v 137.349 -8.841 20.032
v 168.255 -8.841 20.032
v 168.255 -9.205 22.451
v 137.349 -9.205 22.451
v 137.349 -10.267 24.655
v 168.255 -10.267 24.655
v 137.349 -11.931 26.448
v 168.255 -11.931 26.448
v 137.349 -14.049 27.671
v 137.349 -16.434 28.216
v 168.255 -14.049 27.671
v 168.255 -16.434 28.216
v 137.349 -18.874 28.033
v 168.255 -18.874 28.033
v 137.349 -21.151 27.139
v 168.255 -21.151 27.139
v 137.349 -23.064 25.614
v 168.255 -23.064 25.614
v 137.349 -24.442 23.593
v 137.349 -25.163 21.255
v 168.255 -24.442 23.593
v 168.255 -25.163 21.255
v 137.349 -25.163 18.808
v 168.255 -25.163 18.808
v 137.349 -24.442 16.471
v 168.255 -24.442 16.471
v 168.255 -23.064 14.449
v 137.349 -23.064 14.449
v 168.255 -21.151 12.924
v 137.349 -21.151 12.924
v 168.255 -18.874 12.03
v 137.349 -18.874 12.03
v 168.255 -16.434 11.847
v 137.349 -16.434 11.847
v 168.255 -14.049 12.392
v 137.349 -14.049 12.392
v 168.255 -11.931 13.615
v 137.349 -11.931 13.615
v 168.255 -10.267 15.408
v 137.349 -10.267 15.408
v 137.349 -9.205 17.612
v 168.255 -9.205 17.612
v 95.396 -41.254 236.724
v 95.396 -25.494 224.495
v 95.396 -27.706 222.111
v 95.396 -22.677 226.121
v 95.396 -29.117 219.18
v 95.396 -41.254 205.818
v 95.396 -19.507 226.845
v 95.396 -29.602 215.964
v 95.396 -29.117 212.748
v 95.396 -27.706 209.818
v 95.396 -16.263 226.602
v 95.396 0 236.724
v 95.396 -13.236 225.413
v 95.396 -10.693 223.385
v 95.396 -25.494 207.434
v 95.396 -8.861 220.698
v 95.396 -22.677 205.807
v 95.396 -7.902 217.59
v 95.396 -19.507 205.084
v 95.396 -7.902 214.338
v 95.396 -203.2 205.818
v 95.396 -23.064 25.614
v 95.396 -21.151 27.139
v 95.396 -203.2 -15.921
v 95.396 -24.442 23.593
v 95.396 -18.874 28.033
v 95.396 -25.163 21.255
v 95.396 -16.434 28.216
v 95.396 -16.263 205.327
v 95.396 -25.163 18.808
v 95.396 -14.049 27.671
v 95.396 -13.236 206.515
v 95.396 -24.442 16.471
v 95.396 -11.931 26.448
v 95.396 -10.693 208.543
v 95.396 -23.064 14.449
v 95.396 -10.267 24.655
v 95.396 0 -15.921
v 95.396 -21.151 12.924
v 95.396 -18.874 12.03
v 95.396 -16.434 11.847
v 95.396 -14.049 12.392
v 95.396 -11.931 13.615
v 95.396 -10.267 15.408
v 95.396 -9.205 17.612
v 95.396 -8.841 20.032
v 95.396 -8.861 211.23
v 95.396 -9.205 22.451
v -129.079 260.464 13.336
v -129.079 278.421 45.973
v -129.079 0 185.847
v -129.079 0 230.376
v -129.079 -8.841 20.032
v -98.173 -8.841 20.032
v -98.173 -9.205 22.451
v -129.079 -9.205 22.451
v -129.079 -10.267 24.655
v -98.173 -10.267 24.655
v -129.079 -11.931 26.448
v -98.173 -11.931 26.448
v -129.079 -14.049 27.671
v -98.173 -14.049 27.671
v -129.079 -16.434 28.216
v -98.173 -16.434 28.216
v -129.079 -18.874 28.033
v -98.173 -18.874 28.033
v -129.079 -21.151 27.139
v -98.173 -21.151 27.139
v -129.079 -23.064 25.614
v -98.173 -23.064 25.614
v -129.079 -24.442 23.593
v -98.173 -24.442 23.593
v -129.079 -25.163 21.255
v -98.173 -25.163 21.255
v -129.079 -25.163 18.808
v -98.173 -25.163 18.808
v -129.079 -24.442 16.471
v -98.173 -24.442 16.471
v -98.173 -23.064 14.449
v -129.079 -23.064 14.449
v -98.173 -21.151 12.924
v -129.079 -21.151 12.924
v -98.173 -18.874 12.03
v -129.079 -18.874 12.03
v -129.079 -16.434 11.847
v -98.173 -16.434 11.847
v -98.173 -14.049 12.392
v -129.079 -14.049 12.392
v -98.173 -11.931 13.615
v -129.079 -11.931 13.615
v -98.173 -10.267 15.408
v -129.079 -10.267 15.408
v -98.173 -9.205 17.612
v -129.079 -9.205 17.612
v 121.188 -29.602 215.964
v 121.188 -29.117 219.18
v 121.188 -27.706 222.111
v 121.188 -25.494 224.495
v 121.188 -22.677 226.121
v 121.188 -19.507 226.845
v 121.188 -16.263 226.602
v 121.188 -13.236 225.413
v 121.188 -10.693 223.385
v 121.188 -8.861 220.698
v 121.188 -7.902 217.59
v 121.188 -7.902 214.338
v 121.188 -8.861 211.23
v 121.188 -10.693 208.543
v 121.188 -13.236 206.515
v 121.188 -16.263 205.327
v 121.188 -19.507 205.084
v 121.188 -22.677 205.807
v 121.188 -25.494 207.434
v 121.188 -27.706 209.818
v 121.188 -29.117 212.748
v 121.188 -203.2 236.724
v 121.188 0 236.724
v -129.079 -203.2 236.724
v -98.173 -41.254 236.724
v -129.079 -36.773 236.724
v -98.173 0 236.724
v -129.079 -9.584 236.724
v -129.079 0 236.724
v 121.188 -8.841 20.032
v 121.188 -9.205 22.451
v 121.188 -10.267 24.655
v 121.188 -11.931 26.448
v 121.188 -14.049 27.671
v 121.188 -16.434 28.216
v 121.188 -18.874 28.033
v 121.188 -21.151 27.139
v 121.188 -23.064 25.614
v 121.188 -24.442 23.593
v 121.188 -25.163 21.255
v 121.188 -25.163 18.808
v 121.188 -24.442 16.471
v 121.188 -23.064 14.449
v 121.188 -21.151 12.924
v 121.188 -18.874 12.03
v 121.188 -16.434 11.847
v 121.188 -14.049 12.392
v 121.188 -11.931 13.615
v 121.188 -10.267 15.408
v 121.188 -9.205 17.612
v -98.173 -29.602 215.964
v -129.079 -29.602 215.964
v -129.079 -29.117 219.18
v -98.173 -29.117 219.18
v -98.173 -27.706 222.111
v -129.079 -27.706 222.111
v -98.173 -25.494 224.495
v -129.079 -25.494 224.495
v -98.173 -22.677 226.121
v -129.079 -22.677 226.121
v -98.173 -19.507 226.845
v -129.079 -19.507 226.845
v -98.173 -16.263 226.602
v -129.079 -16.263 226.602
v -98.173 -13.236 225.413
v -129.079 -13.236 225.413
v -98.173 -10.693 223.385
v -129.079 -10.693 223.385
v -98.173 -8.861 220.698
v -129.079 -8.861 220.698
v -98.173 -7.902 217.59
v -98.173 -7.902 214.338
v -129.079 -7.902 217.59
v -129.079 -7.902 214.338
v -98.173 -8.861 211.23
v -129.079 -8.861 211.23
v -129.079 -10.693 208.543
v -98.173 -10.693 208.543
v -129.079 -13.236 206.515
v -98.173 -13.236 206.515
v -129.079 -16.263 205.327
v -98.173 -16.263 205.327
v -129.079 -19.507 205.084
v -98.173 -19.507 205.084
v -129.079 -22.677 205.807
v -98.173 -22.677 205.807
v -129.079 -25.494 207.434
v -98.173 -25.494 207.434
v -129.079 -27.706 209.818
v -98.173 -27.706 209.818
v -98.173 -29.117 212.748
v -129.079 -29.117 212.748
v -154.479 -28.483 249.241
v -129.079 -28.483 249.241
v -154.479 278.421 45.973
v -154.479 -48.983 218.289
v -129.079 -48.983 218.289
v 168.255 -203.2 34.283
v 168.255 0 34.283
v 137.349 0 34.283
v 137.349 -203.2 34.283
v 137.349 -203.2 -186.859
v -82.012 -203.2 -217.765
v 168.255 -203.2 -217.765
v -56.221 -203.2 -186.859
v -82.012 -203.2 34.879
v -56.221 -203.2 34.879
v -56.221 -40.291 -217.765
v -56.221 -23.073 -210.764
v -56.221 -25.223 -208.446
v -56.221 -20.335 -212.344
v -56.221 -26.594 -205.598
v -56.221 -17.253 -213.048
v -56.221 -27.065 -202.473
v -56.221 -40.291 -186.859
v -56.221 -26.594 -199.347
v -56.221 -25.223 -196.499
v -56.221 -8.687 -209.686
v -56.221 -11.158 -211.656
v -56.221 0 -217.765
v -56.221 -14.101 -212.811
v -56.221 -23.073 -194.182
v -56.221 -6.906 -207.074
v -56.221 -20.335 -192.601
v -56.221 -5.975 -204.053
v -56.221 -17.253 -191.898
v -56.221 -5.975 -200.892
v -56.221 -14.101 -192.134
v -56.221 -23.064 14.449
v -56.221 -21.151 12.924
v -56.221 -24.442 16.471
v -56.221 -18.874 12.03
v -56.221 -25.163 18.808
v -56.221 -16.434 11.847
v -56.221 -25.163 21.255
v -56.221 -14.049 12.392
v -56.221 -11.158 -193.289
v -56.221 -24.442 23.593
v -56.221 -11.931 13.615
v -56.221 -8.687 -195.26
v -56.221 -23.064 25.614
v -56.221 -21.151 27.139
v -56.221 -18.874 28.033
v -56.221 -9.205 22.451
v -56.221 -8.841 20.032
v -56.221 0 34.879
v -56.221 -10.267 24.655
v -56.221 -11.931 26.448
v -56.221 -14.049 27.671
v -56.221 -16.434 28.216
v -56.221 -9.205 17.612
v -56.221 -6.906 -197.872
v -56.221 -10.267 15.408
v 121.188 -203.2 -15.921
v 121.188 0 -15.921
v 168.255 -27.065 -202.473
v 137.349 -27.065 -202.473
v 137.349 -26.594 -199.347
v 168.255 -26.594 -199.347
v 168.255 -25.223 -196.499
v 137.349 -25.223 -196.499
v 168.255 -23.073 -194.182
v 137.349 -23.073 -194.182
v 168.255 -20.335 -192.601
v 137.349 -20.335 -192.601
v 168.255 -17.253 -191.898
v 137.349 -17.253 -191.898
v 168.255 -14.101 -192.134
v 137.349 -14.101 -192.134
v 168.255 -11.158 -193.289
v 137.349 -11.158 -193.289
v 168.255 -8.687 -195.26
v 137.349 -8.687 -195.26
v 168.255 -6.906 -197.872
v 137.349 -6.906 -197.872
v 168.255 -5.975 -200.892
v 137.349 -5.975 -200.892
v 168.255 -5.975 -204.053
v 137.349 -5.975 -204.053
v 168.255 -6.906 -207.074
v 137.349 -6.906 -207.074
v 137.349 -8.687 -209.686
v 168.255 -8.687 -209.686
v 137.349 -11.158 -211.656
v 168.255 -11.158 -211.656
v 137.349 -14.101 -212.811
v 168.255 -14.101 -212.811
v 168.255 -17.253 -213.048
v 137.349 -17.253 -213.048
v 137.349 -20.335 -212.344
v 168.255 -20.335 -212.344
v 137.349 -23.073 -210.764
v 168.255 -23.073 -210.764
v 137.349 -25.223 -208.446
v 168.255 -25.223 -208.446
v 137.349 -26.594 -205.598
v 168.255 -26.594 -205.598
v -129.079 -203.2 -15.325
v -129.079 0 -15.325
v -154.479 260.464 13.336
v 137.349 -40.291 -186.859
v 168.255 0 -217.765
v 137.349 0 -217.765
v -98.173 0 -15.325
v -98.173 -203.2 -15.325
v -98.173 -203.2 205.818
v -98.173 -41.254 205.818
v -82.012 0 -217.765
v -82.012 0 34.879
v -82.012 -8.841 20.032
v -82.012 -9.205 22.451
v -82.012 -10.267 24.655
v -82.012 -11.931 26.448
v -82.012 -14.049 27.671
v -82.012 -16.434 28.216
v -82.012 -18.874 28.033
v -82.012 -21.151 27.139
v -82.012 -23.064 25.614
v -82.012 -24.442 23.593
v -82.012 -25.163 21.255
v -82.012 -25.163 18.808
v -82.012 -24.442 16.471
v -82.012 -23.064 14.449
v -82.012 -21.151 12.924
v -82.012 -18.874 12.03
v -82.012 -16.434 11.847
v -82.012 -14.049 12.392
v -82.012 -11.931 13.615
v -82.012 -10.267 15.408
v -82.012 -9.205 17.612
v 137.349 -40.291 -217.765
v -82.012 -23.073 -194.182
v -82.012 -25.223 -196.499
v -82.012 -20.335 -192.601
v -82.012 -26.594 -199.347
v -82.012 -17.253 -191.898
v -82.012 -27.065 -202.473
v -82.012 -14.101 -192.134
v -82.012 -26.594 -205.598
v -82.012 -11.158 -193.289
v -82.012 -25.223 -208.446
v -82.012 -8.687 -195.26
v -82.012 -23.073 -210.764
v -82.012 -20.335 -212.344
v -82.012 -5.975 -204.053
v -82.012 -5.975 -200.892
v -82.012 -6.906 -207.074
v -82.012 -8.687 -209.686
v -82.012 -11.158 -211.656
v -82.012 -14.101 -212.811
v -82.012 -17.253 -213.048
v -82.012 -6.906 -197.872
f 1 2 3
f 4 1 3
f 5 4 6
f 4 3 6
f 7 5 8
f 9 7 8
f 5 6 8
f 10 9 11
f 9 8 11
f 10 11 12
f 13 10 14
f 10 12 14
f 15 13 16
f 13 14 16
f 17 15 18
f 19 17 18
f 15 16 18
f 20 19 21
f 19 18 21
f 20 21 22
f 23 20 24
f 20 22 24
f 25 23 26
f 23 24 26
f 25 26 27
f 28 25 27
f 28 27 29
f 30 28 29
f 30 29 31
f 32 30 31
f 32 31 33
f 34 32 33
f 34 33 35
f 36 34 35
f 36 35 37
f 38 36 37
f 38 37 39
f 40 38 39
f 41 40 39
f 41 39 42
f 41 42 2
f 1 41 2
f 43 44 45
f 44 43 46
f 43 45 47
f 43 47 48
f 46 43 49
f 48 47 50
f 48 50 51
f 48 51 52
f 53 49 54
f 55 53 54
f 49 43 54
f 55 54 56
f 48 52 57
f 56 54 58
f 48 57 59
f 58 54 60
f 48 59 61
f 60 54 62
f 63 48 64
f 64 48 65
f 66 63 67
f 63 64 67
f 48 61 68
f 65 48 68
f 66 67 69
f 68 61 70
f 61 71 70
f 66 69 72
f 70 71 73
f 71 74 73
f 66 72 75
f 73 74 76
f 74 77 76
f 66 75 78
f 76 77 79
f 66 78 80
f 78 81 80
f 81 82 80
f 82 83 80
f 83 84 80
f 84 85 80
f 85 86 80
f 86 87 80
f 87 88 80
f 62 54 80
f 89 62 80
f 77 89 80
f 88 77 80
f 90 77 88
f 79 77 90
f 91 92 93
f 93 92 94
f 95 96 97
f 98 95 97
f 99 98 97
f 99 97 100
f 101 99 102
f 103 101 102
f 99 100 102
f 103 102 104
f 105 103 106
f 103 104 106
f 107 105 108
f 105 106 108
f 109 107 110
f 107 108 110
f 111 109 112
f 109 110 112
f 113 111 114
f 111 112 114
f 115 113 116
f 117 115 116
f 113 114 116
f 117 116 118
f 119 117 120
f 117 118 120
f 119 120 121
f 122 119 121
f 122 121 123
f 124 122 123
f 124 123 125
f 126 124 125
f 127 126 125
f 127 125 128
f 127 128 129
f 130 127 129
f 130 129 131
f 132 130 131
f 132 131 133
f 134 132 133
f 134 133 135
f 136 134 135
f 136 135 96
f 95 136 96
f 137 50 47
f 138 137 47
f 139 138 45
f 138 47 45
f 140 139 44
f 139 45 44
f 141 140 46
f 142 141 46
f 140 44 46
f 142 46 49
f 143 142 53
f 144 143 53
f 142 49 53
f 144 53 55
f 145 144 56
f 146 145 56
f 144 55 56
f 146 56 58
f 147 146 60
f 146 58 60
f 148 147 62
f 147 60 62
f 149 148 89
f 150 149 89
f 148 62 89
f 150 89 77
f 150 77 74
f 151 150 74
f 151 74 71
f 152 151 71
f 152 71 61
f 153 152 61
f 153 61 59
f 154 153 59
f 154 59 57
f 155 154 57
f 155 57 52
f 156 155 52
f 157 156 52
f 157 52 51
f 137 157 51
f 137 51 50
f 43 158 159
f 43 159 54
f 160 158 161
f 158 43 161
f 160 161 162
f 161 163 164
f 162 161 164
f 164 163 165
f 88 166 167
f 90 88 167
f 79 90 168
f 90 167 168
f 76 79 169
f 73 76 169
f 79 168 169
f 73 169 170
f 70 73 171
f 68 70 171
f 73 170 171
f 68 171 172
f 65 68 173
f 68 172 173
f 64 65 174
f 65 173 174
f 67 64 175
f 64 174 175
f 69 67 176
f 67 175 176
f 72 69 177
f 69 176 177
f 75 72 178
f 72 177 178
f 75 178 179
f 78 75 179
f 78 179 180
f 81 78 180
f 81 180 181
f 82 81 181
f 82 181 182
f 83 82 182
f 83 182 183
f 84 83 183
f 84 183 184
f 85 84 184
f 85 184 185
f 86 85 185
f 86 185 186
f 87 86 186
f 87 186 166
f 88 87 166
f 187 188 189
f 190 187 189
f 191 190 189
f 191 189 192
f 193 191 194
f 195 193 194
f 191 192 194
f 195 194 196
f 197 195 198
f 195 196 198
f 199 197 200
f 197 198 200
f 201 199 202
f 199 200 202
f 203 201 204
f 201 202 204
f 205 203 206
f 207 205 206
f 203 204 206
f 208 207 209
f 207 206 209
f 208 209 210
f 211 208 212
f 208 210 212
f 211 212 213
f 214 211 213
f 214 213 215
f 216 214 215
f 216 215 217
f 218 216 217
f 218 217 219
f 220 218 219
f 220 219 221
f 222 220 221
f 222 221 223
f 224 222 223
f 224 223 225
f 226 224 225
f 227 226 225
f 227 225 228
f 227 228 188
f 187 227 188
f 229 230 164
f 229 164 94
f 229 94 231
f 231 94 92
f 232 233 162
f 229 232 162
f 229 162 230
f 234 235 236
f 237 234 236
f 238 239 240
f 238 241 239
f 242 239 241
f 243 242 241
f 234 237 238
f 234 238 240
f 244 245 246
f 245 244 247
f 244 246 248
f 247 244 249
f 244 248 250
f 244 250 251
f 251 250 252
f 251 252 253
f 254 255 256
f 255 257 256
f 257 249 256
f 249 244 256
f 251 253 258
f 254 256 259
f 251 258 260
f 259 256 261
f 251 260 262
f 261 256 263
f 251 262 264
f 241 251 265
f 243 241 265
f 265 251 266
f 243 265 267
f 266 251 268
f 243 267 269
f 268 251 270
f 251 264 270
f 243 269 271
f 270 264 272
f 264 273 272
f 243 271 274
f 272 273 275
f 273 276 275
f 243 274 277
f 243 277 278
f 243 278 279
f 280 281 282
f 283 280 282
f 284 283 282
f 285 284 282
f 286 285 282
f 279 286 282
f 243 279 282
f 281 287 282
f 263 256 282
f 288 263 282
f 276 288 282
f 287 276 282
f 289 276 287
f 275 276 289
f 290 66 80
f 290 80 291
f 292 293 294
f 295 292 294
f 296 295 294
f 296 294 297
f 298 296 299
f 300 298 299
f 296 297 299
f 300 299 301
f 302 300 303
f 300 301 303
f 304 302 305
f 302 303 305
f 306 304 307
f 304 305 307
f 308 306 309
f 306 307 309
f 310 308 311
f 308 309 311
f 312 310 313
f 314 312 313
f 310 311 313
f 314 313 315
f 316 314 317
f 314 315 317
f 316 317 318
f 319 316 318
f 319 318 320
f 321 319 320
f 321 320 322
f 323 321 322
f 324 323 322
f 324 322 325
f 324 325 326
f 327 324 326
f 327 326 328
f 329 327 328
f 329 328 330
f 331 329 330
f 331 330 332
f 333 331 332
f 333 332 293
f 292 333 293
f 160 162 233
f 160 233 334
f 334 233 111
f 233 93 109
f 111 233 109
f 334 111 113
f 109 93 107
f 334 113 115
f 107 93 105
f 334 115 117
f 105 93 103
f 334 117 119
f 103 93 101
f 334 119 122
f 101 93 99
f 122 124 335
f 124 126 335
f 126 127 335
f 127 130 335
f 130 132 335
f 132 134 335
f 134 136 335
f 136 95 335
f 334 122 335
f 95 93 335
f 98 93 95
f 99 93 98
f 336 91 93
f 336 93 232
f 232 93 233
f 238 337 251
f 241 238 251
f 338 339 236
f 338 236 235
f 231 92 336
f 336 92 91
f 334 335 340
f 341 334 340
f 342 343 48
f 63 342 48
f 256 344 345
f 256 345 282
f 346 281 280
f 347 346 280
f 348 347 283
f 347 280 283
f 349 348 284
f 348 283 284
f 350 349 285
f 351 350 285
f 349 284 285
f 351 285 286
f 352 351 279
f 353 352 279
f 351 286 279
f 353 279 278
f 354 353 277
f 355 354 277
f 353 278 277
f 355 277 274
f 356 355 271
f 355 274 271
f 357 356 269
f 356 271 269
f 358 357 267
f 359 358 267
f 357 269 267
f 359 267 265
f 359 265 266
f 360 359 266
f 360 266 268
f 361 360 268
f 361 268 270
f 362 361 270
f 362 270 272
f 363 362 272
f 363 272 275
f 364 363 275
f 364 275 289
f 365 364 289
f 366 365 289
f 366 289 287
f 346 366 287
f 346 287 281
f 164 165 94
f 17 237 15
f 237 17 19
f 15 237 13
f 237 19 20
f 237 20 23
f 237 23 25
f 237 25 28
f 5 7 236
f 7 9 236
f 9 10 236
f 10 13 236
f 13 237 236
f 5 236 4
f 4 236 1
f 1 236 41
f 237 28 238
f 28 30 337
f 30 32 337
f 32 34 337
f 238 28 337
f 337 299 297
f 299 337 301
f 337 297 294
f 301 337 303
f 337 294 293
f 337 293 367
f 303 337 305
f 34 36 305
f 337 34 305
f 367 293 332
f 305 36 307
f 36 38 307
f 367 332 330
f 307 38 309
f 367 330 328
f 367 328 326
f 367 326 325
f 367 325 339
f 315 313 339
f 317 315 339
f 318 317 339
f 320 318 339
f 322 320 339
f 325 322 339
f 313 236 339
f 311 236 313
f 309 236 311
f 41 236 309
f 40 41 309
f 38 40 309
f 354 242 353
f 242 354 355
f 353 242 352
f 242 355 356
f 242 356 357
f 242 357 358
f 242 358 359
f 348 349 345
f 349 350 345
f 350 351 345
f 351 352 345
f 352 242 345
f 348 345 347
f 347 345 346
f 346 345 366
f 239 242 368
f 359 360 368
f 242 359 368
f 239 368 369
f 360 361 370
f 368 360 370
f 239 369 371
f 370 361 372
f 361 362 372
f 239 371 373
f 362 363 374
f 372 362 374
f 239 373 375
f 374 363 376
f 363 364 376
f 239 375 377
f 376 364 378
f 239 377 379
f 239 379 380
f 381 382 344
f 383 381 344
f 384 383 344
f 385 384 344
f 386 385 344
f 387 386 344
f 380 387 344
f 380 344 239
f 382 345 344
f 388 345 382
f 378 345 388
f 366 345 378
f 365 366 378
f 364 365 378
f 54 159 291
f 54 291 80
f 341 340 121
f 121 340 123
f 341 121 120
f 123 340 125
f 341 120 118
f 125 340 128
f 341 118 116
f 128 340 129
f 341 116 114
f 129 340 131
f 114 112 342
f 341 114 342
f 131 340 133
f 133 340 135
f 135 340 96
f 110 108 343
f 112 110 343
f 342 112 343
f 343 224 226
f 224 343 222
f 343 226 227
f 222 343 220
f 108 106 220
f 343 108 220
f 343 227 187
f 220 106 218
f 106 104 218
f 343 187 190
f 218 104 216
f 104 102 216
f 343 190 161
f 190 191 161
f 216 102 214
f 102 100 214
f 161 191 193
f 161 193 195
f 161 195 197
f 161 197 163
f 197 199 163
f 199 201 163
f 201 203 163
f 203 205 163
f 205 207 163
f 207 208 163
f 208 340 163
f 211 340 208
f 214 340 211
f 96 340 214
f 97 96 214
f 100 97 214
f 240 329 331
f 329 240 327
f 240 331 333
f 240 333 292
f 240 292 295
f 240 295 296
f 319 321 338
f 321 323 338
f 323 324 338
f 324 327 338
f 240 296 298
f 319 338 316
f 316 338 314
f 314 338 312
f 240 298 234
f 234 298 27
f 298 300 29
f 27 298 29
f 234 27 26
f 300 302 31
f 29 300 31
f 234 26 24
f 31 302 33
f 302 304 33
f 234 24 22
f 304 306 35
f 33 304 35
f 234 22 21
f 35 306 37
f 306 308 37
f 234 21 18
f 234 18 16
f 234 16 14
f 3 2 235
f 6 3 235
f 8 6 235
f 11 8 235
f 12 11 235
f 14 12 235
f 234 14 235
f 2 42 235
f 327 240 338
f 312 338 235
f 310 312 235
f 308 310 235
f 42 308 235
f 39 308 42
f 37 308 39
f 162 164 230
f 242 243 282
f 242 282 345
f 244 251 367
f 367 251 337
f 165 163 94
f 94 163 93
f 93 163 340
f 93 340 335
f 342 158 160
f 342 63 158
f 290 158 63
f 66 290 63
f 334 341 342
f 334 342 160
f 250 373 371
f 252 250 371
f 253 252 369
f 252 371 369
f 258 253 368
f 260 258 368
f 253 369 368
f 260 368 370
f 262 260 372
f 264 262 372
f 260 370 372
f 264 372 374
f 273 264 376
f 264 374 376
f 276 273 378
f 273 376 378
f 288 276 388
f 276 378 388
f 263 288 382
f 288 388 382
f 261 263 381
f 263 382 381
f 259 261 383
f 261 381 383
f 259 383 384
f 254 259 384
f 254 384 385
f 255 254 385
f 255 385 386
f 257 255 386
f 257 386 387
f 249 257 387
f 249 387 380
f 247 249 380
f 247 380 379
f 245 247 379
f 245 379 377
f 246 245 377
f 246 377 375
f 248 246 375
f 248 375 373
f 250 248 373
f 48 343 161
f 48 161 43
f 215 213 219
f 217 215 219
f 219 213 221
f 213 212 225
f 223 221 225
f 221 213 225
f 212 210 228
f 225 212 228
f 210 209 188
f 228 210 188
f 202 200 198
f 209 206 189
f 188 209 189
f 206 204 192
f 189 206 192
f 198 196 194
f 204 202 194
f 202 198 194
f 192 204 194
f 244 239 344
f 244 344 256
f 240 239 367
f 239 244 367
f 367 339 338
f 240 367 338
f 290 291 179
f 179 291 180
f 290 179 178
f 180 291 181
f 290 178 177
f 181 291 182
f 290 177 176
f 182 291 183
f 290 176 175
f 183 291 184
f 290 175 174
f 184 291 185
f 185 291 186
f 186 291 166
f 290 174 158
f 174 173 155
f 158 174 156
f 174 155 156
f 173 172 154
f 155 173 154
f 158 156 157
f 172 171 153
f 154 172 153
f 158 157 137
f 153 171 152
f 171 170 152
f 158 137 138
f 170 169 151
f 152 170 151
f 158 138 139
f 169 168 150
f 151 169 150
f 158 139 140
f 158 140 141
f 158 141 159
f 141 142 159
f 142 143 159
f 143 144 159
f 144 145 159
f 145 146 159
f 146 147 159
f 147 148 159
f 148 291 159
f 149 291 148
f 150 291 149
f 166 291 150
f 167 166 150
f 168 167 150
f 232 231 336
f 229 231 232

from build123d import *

# Parameters (mm, degrees)
F1_DEPTH  = 203.2
F3_ANGLE  = 180
F6_R      = 8.207243473
F7_DEPTH  = 297.3347297916
F8_W      = 193.5693174601
F8_H      = 41.2535853684
F9_DEPTH  = 30.9070513973
F10_W     = 193.5693174601
F10_H     = 40.2909778059
F11_DEPTH = 30.9070513973
F12_R     = 10.9109281405
F12_R_2   = 10.604522365
F13_DEPTH = 297.3347297916
F15_DEPTH = 25.4


with BuildPart() as f1:
    # F0 (on Front) → F1 (new body)
    with BuildSketch(Plane.XZ):
        Polygon((-56.2205016613, 34.8792113364), (-82.0120275021, 34.8792113364), (-82.0120275021, -217.7654653788), (168.2548373938, -217.7654653788), (168.2548373938, 34.2834014446), (137.3488157988, 34.2834014446), (137.3488157988, -186.8594139814), (-56.2205016613, -186.8594139814), align=None)
    extrude(amount=F1_DEPTH)


with BuildPart() as f2_1:
    # F2: copy of F1
    add(f1.part.moved(Location((254, 0, 0))))


with BuildPart() as f2_1_1:
    # F3: moved
    add(f2_1.part.rotate(Axis((171.9879724979, -101.6, 34.8792113364), (0, 1, 0)), F3_ANGLE))


with BuildPart() as f2_1_2:
    # F4: moved
    add(f2_1_1.part.moved(Location((0, 0, -50.8))))


with BuildPart() as f2_1_3:
    # F5: moved
    add(f2_1_2.part.moved(Location((-50.8, 0, 0))))


with BuildPart() as f7_tool:
    # F6 (on face) → F7 (new body, through all)
    with BuildSketch(Plane.YZ.offset(168.2548373938)):
        with Locations((-17.0478224754, 20.0315136462)):
            Circle(F6_R)
    extrude(amount=-F7_DEPTH)


with BuildPart() as f1_1:
    add(f1.part)

    # F7: cut by f7_tool
    add(f7_tool.part, mode=Mode.SUBTRACT)

    # F10 (on face) → F11 (cut, through all)
    with BuildSketch(Plane.XY.offset(-186.8594139814)):
        with Locations((40.5641570687, -20.1454889029)):
            Rectangle(F10_W, F10_H)
    extrude(amount=-F11_DEPTH, mode=Mode.SUBTRACT)


with BuildPart() as f2_1_4:
    add(f2_1_3.part)

    # F7: cut by f7_tool
    add(f7_tool.part, mode=Mode.SUBTRACT)

    # F8 (on face) → F9 (cut, through all)
    with BuildSketch(Plane(origin=(0, 0, 205.8178366542), x_dir=(1, 0, 0), z_dir=(0, 0, -1))):
        with Locations((-1.3882120728, 20.6267926842)):
            Rectangle(F8_W, F8_H)
    extrude(amount=-F9_DEPTH, mode=Mode.SUBTRACT)


with BuildPart() as f13_tool:
    # F12 (on face) → F13 (new body, through all)
    with BuildSketch(Plane(origin=(-129.0788923979, 0, 0), x_dir=(0, -1, 0), z_dir=(-1, 0, 0))):
        with Locations((18.691258505, 215.9641683102)):
            Circle(F12_R)
        with Locations((16.460718587, -202.4726718664)):
            Circle(F12_R_2)
    extrude(amount=-F13_DEPTH)


with BuildPart() as f1_2:
    add(f1_1.part)

    # F13: cut by f13_tool
    add(f13_tool.part, mode=Mode.SUBTRACT)


with BuildPart() as f2_1_5:
    add(f2_1_4.part)

    # F13: cut by f13_tool
    add(f13_tool.part, mode=Mode.SUBTRACT)

    # F14 (on face) → F15 (join)
    with BuildSketch(Plane(origin=(-129.0788923979, 0, 0), x_dir=(0, -1, 0), z_dir=(-1, 0, 0))):
        Polygon((-278.4207538602, 45.9725076163), (-260.46448946, 13.336029835), (48.9830560982, 218.2893455029), (28.4830986757, 249.2410843794), align=None)
    extrude(amount=F15_DEPTH)


solid = Compound([f1_2.part, f2_1_5.part])
